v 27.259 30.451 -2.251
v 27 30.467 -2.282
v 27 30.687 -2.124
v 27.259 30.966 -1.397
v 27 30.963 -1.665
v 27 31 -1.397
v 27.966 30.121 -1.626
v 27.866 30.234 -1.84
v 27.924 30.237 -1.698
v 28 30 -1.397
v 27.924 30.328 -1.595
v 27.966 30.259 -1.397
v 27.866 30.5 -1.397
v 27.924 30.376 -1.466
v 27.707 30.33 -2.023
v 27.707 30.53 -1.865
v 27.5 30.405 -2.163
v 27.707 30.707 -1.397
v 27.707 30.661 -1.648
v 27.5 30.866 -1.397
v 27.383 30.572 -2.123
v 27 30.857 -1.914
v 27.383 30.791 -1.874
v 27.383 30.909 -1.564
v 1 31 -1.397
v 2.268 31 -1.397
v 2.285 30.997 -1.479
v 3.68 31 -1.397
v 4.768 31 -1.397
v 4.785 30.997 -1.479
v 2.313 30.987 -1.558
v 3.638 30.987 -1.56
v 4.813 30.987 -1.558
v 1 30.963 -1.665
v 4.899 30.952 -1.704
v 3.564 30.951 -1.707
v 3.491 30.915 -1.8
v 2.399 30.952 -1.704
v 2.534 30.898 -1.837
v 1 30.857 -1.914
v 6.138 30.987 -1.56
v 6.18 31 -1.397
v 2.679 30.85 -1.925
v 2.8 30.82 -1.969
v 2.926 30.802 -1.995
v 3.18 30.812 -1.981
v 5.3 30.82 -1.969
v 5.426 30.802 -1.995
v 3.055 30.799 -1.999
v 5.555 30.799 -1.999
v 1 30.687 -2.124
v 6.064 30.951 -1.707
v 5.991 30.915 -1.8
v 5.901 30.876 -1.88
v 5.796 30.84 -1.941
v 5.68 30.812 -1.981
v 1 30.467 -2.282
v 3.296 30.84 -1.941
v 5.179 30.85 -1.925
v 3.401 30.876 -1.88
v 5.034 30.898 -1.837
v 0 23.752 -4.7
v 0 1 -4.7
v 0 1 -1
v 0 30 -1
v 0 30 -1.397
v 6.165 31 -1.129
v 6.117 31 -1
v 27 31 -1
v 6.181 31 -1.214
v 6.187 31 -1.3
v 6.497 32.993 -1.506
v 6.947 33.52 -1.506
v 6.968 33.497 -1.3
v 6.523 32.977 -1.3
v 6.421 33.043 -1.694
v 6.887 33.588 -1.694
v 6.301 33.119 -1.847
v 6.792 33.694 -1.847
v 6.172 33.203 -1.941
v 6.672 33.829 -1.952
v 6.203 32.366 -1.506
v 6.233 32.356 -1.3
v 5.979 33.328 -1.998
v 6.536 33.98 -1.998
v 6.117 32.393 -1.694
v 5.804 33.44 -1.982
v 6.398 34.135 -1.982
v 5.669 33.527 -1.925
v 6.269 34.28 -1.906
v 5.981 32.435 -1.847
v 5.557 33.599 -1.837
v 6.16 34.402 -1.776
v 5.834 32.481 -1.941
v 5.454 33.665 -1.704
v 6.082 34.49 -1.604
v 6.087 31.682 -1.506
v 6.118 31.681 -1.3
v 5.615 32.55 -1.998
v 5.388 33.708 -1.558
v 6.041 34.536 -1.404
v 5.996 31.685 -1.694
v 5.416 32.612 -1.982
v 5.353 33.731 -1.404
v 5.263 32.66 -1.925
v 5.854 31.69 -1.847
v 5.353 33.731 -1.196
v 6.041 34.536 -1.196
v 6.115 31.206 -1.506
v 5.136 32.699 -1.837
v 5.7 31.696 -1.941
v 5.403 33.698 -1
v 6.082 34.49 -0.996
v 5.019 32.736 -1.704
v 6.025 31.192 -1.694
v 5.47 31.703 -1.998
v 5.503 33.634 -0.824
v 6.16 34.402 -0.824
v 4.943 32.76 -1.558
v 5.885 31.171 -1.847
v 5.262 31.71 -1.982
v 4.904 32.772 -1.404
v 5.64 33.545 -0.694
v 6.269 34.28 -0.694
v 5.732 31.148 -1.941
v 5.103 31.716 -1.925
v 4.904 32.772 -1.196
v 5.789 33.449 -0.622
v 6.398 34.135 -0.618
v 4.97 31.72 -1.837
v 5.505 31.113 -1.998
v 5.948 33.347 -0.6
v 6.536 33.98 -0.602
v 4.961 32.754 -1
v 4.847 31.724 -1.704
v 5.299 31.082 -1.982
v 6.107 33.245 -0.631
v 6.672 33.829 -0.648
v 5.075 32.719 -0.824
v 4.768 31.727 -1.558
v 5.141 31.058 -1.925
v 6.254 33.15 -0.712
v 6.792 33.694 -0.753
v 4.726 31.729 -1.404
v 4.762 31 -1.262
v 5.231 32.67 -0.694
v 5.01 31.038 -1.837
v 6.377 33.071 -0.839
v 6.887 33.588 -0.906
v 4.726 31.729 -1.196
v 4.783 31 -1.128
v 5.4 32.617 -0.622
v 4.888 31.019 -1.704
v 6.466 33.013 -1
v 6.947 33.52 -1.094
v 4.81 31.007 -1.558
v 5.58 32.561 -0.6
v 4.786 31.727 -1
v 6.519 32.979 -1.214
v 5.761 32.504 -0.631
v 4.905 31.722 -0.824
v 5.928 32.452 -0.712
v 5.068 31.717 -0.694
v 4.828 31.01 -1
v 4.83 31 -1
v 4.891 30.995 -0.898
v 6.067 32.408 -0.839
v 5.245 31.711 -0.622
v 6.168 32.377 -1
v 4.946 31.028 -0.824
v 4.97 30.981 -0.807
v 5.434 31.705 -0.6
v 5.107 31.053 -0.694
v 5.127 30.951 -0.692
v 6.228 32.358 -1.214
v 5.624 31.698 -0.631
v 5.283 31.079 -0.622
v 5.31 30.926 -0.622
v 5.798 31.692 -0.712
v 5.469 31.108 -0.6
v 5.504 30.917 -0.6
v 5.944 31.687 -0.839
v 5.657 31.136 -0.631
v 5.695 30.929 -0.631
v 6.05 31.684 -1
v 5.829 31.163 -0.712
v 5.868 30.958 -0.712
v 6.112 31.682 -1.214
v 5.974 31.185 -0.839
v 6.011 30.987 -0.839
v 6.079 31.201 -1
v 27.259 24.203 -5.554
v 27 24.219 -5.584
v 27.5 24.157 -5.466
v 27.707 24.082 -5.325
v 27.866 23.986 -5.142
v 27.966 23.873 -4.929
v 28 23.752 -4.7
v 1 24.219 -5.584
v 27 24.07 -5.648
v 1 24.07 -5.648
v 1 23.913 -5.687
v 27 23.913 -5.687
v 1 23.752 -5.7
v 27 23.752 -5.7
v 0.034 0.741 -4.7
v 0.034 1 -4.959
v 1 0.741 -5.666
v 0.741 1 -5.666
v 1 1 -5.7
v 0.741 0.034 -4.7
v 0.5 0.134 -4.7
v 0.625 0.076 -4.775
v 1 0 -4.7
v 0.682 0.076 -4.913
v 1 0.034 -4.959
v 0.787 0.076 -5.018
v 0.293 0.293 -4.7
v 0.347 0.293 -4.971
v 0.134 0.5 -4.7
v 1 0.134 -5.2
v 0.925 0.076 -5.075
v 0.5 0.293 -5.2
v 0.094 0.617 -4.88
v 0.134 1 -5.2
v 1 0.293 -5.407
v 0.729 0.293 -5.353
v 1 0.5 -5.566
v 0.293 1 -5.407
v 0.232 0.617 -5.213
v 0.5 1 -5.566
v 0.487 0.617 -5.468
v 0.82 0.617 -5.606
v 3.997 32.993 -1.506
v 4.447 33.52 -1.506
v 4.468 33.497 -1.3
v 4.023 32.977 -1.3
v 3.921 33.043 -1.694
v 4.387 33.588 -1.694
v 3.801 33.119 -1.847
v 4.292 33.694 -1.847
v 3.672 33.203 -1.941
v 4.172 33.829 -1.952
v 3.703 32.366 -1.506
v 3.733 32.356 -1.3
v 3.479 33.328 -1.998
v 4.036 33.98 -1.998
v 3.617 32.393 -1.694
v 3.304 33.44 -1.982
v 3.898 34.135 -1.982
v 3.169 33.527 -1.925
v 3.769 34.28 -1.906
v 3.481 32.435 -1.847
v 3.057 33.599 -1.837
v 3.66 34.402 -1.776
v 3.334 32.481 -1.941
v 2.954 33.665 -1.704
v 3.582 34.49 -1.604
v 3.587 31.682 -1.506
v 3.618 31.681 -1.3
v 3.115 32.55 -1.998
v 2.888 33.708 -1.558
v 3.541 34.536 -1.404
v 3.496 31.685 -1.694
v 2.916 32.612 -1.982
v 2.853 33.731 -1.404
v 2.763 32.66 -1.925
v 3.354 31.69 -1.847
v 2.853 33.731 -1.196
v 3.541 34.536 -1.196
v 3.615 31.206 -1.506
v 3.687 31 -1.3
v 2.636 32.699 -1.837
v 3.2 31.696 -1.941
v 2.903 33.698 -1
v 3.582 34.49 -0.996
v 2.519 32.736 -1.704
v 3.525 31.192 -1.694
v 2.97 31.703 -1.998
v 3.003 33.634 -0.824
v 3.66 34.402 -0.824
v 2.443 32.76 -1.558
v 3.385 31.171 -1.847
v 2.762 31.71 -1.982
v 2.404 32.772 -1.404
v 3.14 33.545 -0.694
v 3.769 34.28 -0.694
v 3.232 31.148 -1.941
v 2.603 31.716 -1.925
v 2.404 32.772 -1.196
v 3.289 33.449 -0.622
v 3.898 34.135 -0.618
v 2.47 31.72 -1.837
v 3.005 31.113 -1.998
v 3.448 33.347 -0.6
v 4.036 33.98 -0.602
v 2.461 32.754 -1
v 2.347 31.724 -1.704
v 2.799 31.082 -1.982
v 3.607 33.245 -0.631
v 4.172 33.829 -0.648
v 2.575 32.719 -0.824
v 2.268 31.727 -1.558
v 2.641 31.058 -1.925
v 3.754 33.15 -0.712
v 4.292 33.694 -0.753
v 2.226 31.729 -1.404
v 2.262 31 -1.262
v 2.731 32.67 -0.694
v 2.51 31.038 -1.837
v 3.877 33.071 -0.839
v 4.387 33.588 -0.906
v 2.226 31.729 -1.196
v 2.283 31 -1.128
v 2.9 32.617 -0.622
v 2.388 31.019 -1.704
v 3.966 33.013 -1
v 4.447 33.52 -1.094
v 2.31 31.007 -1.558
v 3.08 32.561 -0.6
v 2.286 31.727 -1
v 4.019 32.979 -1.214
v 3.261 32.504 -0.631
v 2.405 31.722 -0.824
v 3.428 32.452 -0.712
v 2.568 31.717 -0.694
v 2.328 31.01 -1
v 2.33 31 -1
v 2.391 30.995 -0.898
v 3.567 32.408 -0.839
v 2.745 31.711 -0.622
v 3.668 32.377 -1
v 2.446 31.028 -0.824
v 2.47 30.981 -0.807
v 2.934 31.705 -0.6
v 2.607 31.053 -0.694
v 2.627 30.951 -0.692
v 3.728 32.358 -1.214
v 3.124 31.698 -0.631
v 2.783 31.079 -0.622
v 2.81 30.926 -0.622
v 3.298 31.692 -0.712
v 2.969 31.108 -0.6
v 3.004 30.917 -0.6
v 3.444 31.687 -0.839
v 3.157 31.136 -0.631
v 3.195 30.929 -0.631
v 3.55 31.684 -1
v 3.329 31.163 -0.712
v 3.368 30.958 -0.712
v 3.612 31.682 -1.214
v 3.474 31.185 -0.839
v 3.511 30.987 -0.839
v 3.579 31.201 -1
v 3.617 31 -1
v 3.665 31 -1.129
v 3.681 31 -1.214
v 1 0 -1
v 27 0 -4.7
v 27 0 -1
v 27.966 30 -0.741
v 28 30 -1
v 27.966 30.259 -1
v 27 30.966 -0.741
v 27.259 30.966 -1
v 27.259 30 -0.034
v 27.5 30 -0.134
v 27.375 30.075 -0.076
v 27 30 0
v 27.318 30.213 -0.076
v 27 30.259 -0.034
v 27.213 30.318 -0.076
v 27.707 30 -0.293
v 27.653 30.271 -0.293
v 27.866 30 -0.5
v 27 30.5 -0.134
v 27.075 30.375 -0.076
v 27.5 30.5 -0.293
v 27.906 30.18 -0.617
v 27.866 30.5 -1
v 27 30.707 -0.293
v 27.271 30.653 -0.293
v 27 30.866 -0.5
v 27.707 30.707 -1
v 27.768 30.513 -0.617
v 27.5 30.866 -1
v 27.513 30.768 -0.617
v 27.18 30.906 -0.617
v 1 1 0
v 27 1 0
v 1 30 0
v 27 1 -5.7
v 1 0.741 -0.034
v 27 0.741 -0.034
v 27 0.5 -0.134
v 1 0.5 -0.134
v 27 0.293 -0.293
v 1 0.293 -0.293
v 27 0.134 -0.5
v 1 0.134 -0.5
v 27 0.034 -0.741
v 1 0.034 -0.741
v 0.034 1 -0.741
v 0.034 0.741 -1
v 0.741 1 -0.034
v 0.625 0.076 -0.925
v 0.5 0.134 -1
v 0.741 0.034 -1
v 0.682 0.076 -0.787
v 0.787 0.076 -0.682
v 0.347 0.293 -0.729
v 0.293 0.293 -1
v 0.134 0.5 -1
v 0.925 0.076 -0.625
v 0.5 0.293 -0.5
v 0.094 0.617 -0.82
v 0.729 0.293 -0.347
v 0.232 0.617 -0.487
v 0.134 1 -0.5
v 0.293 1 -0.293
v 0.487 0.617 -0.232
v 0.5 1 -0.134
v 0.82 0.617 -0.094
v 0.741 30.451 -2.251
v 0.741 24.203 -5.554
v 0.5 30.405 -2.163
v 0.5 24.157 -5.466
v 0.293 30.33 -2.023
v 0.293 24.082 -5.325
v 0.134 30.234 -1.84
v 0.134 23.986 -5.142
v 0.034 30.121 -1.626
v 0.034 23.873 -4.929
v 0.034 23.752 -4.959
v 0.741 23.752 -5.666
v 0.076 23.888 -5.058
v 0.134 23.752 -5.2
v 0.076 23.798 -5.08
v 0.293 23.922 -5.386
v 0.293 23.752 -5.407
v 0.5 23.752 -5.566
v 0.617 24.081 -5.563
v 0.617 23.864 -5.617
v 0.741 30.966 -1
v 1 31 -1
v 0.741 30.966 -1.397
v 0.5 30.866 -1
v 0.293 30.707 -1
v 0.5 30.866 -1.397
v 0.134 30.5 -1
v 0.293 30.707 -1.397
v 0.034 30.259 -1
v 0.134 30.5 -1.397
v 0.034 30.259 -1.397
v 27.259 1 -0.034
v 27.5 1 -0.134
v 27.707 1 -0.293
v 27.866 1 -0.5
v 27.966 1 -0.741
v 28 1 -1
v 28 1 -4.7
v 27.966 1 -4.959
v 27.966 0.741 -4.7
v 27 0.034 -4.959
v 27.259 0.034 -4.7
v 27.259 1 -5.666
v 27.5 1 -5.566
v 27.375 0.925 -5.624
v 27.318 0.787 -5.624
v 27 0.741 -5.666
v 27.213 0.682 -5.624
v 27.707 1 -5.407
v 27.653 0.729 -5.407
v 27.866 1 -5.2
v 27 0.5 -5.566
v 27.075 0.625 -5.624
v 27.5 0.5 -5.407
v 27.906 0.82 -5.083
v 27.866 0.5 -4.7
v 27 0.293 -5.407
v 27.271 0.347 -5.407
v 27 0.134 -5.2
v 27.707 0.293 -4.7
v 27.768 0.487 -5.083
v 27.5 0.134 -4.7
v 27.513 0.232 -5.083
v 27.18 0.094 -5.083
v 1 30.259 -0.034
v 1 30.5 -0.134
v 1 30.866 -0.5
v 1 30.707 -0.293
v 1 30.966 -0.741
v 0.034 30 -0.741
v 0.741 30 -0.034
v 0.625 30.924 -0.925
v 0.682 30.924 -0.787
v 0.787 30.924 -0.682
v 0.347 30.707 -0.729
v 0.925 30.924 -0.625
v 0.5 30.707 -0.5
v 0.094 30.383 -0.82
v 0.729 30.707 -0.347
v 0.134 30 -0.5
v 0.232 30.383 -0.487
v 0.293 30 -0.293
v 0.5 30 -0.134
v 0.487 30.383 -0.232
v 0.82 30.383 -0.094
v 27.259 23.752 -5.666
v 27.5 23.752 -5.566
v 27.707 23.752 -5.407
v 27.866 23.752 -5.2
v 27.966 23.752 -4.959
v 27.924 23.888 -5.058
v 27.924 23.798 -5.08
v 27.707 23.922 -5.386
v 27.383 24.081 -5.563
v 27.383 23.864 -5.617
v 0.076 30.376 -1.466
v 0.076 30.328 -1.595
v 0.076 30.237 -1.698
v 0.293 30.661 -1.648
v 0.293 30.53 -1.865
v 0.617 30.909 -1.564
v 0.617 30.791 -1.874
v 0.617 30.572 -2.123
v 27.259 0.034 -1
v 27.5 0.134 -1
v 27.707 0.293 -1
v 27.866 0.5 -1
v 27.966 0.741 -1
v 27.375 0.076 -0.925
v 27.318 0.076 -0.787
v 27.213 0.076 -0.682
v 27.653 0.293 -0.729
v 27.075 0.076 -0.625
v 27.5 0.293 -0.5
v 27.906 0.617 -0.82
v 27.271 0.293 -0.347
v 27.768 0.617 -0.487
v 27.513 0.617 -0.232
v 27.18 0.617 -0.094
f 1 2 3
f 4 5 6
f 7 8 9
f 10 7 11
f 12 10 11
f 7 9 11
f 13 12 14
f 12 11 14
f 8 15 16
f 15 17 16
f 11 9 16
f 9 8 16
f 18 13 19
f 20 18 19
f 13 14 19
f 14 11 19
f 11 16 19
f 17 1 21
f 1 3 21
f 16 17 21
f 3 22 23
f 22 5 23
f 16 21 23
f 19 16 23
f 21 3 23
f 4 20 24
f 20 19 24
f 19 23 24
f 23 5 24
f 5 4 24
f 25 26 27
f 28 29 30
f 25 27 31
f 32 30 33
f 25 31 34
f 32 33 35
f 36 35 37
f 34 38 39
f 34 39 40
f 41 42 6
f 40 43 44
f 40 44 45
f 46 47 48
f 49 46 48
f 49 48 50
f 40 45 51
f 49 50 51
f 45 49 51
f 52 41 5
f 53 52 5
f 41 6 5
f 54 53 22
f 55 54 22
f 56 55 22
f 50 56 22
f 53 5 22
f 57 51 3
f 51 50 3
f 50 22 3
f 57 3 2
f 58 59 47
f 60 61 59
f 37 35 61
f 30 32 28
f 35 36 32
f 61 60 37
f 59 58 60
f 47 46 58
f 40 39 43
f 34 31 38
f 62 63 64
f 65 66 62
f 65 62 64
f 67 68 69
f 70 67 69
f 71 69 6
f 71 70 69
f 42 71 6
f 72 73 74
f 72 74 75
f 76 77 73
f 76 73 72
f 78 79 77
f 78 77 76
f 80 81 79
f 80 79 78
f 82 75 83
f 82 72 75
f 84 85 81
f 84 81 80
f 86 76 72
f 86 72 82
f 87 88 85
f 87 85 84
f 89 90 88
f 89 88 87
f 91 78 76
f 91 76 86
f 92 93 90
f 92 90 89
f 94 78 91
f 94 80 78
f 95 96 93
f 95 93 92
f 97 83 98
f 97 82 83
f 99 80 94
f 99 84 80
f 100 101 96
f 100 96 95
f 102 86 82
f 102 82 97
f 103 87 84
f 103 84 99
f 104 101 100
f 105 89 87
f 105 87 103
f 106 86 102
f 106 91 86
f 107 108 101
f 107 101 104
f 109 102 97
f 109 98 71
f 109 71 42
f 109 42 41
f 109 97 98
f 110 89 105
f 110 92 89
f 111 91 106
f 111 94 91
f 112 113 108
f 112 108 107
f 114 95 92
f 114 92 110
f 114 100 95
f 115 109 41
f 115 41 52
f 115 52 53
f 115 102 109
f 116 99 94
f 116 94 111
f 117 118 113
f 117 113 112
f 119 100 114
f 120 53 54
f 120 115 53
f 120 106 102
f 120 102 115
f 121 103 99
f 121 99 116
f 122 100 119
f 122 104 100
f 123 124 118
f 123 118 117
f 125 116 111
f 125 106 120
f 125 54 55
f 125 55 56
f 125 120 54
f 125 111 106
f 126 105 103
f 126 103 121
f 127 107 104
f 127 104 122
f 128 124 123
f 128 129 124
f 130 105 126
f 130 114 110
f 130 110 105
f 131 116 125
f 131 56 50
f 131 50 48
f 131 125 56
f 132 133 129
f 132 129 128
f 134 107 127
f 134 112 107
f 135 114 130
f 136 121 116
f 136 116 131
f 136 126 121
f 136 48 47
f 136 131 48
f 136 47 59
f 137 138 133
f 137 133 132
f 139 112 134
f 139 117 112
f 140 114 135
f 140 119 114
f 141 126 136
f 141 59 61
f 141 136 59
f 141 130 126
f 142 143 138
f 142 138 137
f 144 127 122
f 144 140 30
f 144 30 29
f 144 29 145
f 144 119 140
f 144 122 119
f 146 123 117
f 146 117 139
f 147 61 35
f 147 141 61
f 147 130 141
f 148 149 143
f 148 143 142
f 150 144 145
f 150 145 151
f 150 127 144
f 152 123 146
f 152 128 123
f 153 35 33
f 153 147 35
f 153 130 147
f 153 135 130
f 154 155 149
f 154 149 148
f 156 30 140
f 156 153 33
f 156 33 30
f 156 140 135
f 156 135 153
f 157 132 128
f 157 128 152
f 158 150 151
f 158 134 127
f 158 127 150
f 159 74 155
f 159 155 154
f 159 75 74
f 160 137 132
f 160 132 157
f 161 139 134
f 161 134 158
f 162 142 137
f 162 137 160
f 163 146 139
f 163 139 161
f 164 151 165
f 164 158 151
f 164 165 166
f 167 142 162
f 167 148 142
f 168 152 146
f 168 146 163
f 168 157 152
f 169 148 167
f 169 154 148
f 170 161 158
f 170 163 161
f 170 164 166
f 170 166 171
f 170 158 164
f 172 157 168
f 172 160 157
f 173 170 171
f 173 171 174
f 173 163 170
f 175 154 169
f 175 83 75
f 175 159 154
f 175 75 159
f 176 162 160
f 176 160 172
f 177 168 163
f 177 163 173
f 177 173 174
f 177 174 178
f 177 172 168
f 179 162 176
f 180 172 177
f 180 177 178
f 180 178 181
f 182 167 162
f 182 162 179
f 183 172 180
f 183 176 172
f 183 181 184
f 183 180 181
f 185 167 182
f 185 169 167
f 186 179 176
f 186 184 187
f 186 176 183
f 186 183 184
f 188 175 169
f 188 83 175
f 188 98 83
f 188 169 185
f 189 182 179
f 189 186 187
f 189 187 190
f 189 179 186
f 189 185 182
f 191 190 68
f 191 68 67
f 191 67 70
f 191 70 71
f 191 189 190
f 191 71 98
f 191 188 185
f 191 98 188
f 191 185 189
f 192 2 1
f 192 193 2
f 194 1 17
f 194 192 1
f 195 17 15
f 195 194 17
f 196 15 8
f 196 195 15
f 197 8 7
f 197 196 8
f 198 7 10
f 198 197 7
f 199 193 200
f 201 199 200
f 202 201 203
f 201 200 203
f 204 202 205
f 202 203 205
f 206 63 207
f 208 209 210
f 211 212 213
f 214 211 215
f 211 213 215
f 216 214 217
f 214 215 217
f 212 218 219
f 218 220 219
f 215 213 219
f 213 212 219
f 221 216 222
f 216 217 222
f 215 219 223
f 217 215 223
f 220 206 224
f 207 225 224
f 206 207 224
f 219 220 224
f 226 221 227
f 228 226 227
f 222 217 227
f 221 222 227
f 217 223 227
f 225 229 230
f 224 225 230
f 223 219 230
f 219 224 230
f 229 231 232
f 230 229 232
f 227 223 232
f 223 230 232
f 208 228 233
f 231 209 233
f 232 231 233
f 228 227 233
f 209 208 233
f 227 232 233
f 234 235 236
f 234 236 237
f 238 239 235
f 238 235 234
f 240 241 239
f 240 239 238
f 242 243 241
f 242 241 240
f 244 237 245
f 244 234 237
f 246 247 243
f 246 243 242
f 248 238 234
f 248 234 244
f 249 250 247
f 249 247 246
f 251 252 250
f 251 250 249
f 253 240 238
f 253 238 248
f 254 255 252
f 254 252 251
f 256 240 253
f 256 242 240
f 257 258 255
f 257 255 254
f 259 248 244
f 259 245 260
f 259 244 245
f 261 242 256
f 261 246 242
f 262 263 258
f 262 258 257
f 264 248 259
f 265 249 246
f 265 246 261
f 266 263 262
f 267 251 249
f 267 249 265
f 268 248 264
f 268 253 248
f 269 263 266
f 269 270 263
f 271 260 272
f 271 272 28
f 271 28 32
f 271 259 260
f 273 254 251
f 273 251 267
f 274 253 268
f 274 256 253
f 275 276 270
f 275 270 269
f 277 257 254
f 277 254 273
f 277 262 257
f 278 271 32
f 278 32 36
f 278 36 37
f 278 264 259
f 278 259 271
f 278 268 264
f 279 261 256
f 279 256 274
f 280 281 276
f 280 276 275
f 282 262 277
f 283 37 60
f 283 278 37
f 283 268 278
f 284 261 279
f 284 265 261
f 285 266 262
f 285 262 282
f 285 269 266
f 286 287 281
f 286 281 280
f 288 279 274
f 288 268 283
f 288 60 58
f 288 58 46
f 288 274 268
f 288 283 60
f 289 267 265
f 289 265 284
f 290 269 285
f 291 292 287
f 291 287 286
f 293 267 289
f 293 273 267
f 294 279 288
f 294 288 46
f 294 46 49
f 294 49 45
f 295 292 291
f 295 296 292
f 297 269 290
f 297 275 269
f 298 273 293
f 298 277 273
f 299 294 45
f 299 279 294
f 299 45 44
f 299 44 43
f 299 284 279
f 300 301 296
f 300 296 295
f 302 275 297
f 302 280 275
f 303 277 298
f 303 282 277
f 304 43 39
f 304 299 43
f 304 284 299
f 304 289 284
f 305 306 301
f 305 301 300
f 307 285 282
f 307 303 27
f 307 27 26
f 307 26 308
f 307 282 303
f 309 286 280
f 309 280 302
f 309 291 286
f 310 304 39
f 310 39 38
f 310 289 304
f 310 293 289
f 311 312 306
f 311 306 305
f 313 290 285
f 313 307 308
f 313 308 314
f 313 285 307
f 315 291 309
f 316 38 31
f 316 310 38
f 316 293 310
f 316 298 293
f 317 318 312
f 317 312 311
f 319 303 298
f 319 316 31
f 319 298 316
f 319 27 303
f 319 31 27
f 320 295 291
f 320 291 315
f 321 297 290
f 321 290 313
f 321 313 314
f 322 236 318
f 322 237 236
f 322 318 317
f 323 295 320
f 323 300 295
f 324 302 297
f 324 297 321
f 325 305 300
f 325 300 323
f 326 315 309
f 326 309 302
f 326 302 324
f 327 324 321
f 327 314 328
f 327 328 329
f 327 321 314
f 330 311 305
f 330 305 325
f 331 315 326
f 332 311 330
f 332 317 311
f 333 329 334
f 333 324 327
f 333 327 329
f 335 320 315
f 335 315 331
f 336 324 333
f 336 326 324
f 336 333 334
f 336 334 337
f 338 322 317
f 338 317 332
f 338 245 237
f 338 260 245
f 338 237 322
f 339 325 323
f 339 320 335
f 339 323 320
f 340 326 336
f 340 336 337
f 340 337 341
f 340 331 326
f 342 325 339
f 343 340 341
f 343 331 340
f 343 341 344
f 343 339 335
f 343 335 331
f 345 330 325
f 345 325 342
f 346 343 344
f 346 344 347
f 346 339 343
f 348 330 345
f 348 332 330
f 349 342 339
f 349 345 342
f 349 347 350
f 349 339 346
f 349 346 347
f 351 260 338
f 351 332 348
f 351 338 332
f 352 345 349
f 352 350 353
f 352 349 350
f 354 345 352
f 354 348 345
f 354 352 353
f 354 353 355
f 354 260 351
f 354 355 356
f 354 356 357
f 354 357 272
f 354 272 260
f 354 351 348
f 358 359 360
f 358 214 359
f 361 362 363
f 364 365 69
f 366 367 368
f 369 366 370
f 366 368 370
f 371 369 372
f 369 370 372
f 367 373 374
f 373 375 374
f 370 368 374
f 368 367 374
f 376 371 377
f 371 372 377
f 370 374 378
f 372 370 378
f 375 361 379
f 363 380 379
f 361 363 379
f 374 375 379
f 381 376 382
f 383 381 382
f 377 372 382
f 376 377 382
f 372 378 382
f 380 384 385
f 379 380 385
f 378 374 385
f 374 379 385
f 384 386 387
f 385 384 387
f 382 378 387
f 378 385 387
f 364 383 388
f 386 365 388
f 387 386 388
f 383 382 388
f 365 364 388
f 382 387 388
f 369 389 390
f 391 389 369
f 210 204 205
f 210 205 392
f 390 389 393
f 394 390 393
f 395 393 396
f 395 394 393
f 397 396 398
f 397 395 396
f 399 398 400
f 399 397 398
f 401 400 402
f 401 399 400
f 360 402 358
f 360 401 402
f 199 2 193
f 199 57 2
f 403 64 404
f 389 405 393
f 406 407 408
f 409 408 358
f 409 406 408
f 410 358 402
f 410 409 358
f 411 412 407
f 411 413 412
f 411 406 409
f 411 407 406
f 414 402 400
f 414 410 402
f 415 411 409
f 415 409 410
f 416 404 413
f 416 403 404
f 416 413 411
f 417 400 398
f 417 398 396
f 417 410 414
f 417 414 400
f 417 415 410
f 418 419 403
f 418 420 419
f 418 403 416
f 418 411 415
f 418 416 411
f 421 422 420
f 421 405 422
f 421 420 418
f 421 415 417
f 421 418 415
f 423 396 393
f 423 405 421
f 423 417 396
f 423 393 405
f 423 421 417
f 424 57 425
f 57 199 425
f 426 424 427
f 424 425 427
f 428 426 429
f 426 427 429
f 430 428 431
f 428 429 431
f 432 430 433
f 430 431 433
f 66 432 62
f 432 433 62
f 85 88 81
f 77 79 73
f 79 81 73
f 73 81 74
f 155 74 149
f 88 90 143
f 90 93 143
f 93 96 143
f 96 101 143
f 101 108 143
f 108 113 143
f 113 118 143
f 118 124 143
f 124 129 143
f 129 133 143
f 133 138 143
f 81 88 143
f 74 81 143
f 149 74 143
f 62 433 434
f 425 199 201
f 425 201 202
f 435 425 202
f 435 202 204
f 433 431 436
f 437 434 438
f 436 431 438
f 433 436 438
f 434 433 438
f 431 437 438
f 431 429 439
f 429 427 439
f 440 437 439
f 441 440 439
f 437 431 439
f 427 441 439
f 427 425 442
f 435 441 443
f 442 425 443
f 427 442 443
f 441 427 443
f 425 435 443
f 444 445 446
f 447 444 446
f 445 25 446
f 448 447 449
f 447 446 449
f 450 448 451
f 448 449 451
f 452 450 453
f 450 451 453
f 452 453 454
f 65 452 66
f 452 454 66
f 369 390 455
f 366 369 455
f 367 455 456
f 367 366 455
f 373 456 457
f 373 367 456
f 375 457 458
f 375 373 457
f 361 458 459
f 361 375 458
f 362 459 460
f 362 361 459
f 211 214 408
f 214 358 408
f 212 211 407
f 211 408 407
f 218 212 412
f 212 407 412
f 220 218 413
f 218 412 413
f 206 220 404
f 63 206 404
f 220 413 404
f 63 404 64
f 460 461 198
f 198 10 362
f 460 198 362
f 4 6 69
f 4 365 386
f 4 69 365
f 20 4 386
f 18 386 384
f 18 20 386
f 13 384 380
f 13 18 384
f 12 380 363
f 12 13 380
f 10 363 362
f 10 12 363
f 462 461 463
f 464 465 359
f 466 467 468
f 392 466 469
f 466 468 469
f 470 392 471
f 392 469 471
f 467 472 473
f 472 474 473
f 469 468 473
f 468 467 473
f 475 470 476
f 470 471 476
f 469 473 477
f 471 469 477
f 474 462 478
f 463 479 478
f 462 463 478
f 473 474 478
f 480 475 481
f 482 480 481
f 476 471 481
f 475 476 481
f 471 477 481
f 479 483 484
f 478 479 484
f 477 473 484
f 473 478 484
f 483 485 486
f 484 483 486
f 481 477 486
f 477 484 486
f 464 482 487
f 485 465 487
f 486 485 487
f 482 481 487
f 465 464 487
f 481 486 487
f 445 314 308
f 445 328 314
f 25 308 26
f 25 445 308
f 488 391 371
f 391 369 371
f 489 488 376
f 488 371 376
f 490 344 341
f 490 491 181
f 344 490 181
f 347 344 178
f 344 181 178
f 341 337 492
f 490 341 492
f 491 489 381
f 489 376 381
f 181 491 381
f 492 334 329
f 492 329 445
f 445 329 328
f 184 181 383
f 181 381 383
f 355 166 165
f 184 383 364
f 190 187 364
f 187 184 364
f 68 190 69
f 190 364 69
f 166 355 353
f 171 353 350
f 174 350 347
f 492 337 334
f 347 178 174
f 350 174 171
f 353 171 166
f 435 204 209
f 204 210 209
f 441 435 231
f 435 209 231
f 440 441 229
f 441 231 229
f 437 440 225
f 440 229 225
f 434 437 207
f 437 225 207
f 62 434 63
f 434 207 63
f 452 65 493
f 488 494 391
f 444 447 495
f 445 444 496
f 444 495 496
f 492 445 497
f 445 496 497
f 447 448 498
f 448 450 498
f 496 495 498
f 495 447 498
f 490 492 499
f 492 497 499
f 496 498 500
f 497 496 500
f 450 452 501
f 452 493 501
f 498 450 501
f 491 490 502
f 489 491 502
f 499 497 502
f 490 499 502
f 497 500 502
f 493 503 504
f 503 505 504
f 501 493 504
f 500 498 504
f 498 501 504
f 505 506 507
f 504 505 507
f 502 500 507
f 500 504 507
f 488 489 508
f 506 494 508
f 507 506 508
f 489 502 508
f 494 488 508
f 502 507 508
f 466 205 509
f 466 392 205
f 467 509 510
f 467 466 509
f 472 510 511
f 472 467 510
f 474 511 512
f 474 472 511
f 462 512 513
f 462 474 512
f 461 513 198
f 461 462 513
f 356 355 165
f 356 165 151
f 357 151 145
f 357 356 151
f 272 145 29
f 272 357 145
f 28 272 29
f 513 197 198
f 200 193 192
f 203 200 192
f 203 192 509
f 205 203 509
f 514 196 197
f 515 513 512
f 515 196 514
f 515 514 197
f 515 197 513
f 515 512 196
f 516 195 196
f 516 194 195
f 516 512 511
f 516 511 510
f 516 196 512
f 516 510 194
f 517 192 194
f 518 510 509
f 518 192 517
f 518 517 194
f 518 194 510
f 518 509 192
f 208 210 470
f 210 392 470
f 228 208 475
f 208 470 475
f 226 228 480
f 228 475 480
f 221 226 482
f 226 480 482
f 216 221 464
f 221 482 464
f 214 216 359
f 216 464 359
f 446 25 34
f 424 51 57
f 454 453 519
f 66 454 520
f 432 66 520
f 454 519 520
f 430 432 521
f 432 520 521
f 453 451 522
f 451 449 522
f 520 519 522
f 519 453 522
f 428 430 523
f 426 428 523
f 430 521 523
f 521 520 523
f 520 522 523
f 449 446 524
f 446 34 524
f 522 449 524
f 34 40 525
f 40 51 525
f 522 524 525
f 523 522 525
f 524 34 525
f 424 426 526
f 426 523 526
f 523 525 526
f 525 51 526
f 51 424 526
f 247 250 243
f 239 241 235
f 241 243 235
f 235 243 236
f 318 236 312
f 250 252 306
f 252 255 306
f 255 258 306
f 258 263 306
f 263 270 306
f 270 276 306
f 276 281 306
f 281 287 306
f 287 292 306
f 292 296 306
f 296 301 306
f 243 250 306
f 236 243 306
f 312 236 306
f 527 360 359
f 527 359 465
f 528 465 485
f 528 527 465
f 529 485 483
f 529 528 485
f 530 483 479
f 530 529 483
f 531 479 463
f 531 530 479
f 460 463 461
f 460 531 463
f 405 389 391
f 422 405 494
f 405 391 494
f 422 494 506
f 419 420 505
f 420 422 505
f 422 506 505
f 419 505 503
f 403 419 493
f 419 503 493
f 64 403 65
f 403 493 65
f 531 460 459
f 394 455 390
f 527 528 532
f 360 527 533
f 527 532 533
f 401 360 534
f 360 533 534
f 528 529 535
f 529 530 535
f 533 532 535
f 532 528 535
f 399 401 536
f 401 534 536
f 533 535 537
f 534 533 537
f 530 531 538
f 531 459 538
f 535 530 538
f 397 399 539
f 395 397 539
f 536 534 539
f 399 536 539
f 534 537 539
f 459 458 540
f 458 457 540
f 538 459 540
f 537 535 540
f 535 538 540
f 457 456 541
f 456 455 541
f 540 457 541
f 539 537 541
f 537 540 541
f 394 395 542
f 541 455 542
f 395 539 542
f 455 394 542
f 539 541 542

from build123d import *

# Parameters (mm, degrees)
EXTRUDE_1_DEPTH        = 28
FILLET_1_R             = 1
SWEEP_1_PROFILE_R      = 0.7
PATTERN_LINEAR_1_COUNT = 2
PATTERN_LINEAR_1_PITCH = 2.5


with BuildPart() as part:
    # 草图1 → 凸台-拉伸1 (new body)
    with BuildSketch(Plane(origin=(0, 0, 0), x_dir=(0, 0, -1), z_dir=(1, 0, 0))):
        Polygon((0, 0), (0, 31), (2, 31), (5.7, 24), (5.7, 0), align=None)
    extrude(amount=EXTRUDE_1_DEPTH)

    # 圆角1
    fillet_1_edges = [part.edges().sort_by_distance(p)[0] for p in [
        (28, 27.5, -3.85),
        (28, 31, -1),
        (28, 15.5, 0),
        (28, 0, -2.85),
        (0, 15.5, 0),
        (0, 31, -1),
        (0, 27.5, -3.85),
        (0, 12, -5.7),
        (0, 0, -2.85),
        (28, 12, -5.7),
        (14, 0, 0),
        (14, 31, 0),
        (14, 31, -2),
        (14, 24, -5.7),
        (14, 0, -5.7),
    ]]
    fillet(fillet_1_edges, radius=FILLET_1_R)

    # 扫描1: sweep along a path in 草图2
    with BuildLine(Plane.XY.offset(-1.3)) as sweep_1_path:
        ThreePointArc((4.001651966, 34.019317003), (2.935743371, 31.239649146), (4.579965561, 28.757865933))
    # 扫描1 profile (on start of the path) → 扫描1 (sweep)
    with BuildSketch(Plane(origin=(4.001651966, 34.019317003, -1.3), x_dir=(0.6661061501000685, -0.745856954649392, 0), z_dir=(-0.745856954649392, -0.6661061501000685, 0))):
        Circle(SWEEP_1_PROFILE_R)
    sweep_1 = sweep(path=sweep_1_path.line)

    # 阵列(线性)1: 扫描1 ×2
    with Locations(*[(i * PATTERN_LINEAR_1_PITCH, 0, 0) for i in range(1, PATTERN_LINEAR_1_COUNT)]):
        add(sweep_1)


solid = part.part
